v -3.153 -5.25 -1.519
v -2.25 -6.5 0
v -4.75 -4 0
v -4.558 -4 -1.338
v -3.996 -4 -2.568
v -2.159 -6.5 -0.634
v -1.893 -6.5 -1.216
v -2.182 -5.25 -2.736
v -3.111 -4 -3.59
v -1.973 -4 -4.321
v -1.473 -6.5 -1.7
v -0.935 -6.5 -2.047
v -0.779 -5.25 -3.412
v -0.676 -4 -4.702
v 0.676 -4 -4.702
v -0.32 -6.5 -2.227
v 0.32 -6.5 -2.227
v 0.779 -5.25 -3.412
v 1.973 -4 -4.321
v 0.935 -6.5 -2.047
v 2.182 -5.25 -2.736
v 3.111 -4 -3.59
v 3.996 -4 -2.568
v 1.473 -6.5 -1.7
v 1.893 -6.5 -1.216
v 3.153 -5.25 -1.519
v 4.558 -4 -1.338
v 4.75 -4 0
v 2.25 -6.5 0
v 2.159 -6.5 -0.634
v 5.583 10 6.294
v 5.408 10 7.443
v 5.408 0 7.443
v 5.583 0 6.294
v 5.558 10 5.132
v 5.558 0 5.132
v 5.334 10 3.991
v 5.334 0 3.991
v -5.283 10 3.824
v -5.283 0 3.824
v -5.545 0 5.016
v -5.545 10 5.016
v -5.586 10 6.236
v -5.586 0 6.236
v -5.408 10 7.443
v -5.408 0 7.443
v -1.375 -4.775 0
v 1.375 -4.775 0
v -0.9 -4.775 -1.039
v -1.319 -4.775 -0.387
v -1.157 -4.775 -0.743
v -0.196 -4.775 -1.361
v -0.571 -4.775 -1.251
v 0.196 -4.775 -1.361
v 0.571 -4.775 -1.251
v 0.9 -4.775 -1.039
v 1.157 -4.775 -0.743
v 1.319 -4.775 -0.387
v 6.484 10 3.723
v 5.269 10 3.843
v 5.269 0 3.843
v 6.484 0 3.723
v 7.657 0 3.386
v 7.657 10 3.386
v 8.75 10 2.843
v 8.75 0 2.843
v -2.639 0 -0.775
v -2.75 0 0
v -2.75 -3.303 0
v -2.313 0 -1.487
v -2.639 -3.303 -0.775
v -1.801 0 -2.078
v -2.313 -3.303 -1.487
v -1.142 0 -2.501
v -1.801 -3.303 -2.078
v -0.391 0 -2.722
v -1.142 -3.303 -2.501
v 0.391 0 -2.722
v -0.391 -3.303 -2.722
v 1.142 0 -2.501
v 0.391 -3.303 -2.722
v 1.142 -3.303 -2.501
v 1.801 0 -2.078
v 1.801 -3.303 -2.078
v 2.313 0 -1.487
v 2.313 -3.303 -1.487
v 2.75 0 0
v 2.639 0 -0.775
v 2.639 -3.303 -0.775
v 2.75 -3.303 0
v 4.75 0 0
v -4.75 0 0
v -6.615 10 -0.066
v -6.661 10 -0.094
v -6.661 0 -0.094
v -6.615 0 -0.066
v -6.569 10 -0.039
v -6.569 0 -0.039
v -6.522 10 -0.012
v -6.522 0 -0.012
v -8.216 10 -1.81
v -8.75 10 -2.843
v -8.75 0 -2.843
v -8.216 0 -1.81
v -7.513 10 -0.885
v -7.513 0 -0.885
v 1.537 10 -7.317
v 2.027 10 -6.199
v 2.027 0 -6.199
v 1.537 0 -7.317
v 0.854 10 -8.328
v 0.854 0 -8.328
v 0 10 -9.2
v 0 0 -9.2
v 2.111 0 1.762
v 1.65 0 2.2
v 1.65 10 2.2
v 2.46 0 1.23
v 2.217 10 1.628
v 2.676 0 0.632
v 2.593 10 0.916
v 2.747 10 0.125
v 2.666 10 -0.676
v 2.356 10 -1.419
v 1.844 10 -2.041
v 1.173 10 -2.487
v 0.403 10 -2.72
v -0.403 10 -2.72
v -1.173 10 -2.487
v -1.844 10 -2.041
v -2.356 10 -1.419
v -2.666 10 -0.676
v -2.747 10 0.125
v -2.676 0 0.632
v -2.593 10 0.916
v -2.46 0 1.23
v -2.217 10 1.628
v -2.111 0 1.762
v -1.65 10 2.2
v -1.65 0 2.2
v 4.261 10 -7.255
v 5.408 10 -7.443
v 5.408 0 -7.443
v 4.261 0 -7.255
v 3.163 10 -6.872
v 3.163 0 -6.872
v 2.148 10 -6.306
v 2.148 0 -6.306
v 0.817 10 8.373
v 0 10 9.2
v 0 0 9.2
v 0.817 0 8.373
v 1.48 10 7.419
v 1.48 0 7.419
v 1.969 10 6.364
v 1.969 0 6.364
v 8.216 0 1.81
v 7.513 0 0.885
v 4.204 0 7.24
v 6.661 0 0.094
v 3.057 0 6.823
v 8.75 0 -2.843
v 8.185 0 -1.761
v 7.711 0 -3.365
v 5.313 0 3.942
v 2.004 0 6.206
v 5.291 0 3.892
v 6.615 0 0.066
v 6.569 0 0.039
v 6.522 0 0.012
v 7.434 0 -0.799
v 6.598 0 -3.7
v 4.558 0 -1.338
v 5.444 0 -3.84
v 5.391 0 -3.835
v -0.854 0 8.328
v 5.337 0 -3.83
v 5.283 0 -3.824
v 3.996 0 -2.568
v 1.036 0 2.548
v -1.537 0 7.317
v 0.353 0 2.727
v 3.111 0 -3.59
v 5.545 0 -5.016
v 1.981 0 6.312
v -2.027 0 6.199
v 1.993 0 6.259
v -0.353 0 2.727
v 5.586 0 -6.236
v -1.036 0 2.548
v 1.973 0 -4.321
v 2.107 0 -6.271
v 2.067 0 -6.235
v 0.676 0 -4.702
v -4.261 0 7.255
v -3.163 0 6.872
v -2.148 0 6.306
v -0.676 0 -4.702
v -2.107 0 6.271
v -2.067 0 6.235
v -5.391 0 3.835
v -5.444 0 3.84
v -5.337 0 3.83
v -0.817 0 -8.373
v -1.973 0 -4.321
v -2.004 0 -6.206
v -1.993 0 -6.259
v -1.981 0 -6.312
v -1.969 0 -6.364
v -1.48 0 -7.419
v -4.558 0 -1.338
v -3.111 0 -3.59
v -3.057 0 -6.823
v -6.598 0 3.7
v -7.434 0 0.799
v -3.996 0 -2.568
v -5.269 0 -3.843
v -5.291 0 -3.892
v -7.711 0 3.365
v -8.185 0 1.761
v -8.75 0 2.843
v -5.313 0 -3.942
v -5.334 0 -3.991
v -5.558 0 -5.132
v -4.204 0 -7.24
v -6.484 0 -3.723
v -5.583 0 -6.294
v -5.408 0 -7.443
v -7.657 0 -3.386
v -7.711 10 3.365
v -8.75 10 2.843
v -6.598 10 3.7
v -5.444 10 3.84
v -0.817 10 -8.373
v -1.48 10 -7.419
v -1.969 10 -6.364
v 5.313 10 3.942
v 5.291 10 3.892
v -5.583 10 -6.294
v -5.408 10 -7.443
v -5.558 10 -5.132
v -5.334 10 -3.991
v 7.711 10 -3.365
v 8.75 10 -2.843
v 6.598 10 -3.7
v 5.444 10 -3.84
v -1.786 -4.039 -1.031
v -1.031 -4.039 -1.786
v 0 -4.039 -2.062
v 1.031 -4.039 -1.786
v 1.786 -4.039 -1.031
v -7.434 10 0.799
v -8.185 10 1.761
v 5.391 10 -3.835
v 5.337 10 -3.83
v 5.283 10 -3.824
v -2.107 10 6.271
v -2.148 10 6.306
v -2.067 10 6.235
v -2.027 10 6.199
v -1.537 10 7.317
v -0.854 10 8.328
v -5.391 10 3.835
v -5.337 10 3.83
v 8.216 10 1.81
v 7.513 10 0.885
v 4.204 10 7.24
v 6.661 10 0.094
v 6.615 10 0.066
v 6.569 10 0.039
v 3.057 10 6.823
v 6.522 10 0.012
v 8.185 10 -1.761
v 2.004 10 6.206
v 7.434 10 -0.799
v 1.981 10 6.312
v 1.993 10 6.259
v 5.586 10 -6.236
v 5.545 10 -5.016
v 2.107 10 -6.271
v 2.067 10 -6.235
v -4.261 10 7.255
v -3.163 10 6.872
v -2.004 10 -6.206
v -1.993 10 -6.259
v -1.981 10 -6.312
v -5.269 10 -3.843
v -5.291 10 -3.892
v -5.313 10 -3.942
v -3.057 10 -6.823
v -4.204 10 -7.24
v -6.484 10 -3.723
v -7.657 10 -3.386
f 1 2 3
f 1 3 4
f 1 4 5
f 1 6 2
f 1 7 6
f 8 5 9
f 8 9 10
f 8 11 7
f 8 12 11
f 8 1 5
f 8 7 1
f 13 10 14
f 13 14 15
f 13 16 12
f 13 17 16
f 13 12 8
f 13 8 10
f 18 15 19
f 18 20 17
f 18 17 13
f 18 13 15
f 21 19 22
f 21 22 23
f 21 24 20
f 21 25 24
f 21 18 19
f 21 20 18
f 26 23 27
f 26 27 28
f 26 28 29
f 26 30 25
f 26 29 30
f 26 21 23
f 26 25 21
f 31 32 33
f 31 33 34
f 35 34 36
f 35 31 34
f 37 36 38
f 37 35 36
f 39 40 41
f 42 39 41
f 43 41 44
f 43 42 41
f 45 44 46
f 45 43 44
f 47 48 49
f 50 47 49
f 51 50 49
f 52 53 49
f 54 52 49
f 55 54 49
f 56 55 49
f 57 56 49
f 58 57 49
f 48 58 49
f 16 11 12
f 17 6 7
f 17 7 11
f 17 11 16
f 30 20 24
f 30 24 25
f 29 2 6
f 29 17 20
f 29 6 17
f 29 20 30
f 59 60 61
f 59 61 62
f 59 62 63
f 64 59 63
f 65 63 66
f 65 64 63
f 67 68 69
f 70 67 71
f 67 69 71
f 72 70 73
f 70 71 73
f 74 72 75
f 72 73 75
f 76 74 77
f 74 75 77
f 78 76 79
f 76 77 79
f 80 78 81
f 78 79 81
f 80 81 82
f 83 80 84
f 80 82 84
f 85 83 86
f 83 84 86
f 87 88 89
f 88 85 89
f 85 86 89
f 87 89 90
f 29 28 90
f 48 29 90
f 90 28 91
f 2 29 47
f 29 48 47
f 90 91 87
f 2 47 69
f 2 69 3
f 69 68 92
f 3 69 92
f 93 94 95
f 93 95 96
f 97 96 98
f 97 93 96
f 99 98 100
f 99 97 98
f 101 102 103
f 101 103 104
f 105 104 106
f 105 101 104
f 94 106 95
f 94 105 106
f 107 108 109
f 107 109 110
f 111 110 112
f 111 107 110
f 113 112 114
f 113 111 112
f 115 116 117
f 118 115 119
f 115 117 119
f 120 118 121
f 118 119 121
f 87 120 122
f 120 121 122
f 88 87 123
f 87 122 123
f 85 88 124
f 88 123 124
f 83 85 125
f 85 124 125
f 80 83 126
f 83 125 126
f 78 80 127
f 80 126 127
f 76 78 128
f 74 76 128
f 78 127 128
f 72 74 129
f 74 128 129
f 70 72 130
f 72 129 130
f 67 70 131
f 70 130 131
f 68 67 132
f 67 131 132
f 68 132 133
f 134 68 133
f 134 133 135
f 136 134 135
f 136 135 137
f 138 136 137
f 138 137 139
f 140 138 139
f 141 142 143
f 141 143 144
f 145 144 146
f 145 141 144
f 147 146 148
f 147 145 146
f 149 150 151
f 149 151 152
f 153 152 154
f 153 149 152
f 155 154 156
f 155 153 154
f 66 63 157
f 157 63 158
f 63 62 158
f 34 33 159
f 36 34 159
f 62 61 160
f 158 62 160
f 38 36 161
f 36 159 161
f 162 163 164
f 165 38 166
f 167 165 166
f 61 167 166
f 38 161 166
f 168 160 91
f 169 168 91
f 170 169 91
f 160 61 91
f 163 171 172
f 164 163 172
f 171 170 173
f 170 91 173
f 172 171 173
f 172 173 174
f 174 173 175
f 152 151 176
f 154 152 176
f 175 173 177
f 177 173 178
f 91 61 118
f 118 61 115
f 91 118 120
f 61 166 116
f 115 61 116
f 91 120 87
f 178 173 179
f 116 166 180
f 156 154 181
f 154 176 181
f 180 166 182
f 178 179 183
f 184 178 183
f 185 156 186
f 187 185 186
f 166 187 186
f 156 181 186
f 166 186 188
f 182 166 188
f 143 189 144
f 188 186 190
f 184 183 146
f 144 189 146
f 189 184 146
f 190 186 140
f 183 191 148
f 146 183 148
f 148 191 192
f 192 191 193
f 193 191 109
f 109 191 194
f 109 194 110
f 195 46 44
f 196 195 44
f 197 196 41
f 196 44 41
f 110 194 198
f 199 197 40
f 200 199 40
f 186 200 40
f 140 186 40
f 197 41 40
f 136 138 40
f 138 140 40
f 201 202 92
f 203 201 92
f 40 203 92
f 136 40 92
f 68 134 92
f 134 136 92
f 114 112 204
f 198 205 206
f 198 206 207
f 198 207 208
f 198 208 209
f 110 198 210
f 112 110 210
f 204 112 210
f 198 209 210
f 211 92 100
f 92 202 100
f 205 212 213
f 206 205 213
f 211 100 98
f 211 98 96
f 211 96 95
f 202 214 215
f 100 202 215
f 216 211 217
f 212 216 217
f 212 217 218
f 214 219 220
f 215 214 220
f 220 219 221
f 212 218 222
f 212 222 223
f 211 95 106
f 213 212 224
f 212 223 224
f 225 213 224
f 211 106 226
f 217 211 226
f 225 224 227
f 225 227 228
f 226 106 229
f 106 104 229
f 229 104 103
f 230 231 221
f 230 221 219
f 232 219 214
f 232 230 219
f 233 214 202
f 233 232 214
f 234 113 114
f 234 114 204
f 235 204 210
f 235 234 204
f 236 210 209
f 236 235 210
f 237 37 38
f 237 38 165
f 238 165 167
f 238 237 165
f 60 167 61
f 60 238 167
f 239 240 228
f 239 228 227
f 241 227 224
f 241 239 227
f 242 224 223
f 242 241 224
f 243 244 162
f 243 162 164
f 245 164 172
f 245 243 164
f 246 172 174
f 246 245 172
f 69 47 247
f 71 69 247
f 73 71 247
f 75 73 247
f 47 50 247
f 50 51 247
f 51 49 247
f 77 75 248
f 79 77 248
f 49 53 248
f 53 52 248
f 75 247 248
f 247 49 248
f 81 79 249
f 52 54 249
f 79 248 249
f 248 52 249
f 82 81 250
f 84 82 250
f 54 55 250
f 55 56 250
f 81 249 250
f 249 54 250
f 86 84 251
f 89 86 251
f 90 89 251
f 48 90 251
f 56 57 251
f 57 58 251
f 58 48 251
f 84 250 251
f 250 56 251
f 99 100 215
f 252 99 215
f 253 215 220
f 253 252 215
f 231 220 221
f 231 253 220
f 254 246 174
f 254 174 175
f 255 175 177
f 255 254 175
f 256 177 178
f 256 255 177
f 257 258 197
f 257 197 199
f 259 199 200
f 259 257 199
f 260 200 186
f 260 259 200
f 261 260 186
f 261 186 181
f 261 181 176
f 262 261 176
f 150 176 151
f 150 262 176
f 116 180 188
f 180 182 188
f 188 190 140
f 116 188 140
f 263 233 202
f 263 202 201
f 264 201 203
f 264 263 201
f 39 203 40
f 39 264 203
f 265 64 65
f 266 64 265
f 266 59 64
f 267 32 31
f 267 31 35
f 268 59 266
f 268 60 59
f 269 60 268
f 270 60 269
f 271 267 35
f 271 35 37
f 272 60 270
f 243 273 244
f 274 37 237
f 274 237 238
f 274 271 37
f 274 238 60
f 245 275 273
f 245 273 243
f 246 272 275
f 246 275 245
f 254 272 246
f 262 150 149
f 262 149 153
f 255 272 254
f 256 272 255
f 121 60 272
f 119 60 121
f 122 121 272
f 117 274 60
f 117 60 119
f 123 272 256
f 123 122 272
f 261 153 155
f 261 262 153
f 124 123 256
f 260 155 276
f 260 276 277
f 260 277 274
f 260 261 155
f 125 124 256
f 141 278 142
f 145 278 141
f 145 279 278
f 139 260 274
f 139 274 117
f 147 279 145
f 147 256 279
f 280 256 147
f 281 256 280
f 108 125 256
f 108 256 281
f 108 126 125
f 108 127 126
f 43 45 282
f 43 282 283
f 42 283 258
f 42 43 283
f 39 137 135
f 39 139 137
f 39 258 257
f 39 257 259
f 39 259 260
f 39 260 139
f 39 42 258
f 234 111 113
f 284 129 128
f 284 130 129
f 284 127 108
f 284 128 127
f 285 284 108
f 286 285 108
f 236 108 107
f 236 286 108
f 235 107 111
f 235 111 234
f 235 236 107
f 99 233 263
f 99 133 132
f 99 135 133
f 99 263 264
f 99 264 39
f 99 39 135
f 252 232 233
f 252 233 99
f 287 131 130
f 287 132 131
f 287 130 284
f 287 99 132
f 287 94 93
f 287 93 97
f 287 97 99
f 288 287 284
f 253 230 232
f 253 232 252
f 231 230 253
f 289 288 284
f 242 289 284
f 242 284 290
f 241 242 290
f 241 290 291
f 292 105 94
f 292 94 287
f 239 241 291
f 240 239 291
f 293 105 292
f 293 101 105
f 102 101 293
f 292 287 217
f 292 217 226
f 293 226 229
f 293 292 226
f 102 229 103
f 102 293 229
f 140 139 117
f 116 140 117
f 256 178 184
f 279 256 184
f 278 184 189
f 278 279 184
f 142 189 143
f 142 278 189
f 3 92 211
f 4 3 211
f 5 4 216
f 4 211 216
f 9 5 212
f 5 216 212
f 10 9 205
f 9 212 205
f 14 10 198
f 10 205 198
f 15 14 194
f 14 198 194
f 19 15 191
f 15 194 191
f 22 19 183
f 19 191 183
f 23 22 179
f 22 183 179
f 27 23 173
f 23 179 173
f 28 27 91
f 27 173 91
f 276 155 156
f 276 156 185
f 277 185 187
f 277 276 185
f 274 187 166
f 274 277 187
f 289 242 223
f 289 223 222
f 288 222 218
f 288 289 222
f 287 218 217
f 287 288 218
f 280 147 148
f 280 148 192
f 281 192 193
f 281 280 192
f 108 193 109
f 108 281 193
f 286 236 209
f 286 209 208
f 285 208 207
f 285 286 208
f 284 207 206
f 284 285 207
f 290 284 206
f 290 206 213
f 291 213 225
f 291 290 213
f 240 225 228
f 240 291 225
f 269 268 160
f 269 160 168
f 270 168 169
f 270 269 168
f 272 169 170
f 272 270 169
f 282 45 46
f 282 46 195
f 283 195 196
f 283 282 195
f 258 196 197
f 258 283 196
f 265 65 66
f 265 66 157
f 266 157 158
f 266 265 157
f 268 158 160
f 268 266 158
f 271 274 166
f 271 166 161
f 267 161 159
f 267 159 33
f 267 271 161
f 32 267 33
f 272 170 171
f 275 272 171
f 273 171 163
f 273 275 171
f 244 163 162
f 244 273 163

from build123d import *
from build123d import SkipClean  # not in build123d's __all__

# Parameters (mm, degrees)
F0_W            = 6.5
F0_H            = 10
F3_DEPTH        = 25
F5_DEPTH        = 10
F5_COPIES_COUNT = 10
F7_DEPTH        = 6.5
F9_SIZE         = 2.5


# Not quite as in the source:
# - a pattern or mirror of a feature is missing from the dataset's text; its kind, count and spacing are read off the source's solid
# - a feature names something its author has since deleted; it is built from what else it names


with BuildPart() as f1:
    # F0 (on Top) → F1 (revolve)
    with BuildSketch(Plane.XY):
        with Locations((-3.25, 5)):
            Rectangle(F0_W, F0_H)
    revolve(axis=Axis((0, 5, 0), (0, 1, 0)))

    # F2 (on face) → F3 (cut)
    with BuildSketch(Plane(origin=(0, 10, 0), x_dir=(-1, 0, 0), z_dir=(0, 1, 0))):
        with BuildLine():
            Line((1.65, 2.2), (-1.65, 2.2))
            ThreePointArc((-1.65, 2.2), (0, -2.75), (1.65, 2.2))
        make_face()
    extrude(amount=-F3_DEPTH, mode=Mode.SUBTRACT)

    # F4 (on face) → F5 (join)
    with BuildSketch(Plane(origin=(0, 10, 0), x_dir=(-1, 0, 0), z_dir=(0, 1, 0))):
        with BuildLine():
            ThreePointArc((-2.0086104634, 6.1818673559), (0.0140777422, 6.4999847551), (2.0353690139, 6.1731088584))
            ThreePointArc((2.0353690139, 6.1731088584), (1.2263837508, 7.8268898276), (0, 9.2))
            ThreePointArc((0, 9.2), (-1.1693294851, 7.9103781541), (-1.9692767773, 6.3642409415))
            ThreePointArc((-1.9692767773, 6.3642409415), (-1.9898456325, 6.2732486915), (-2.0086104634, 6.1818673559))
        make_face()
    f5 = extrude(amount=-F5_DEPTH)

    # F5_copies: F5 ×10 about axis
    f5_copies_axis = Axis((0, 0, 0), (0, 1, 0))
    for i in range(1, F5_COPIES_COUNT):
        add(f5.rotate(f5_copies_axis, i * 360 / F5_COPIES_COUNT), clean=False)

    # F6 (on face) → F7 (join)
    with BuildSketch(Plane.XZ):
        with BuildLine():
            Line((-2.75, 0), (-4.75, 0))
            ThreePointArc((-4.75, 0), (0, -4.75), (4.75, 0))
            Line((4.75, 0), (2.75, 0))
            ThreePointArc((2.75, 0), (0, -2.75), (-2.75, 0))
        make_face()
        with BuildLine():
            Line((2.75, 0), (-2.75, 0))
            ThreePointArc((-2.75, 0), (0, -2.75), (2.75, 0))
        make_face()
    extrude(amount=F7_DEPTH)

    # F9
    f9_edges = [f1.edges().sort_by_distance(p)[0] for p in [
        (0, -6.5, -4.75),
    ]]
    chamfer(f9_edges, length=F9_SIZE)

    # F8 (on face) → F10 (revolve, cut)
    with BuildSketch(Plane.XY):
        Polygon((0, -1.3273195364), (0, 0), (-2.75, 0), (-2.75, -3.3025264561), (-1.375, -4.775), (0, -4.775), (0, -3.3025264561), (0, -1.8300529122), align=None)
    with SkipClean():  # cleaning this boolean's faces spoils the solid; the shape is the same uncleaned
        revolve(axis=Axis((0, -3.3025264561, 0), (0, -1, 0)), mode=Mode.SUBTRACT)


solid = f1.part
